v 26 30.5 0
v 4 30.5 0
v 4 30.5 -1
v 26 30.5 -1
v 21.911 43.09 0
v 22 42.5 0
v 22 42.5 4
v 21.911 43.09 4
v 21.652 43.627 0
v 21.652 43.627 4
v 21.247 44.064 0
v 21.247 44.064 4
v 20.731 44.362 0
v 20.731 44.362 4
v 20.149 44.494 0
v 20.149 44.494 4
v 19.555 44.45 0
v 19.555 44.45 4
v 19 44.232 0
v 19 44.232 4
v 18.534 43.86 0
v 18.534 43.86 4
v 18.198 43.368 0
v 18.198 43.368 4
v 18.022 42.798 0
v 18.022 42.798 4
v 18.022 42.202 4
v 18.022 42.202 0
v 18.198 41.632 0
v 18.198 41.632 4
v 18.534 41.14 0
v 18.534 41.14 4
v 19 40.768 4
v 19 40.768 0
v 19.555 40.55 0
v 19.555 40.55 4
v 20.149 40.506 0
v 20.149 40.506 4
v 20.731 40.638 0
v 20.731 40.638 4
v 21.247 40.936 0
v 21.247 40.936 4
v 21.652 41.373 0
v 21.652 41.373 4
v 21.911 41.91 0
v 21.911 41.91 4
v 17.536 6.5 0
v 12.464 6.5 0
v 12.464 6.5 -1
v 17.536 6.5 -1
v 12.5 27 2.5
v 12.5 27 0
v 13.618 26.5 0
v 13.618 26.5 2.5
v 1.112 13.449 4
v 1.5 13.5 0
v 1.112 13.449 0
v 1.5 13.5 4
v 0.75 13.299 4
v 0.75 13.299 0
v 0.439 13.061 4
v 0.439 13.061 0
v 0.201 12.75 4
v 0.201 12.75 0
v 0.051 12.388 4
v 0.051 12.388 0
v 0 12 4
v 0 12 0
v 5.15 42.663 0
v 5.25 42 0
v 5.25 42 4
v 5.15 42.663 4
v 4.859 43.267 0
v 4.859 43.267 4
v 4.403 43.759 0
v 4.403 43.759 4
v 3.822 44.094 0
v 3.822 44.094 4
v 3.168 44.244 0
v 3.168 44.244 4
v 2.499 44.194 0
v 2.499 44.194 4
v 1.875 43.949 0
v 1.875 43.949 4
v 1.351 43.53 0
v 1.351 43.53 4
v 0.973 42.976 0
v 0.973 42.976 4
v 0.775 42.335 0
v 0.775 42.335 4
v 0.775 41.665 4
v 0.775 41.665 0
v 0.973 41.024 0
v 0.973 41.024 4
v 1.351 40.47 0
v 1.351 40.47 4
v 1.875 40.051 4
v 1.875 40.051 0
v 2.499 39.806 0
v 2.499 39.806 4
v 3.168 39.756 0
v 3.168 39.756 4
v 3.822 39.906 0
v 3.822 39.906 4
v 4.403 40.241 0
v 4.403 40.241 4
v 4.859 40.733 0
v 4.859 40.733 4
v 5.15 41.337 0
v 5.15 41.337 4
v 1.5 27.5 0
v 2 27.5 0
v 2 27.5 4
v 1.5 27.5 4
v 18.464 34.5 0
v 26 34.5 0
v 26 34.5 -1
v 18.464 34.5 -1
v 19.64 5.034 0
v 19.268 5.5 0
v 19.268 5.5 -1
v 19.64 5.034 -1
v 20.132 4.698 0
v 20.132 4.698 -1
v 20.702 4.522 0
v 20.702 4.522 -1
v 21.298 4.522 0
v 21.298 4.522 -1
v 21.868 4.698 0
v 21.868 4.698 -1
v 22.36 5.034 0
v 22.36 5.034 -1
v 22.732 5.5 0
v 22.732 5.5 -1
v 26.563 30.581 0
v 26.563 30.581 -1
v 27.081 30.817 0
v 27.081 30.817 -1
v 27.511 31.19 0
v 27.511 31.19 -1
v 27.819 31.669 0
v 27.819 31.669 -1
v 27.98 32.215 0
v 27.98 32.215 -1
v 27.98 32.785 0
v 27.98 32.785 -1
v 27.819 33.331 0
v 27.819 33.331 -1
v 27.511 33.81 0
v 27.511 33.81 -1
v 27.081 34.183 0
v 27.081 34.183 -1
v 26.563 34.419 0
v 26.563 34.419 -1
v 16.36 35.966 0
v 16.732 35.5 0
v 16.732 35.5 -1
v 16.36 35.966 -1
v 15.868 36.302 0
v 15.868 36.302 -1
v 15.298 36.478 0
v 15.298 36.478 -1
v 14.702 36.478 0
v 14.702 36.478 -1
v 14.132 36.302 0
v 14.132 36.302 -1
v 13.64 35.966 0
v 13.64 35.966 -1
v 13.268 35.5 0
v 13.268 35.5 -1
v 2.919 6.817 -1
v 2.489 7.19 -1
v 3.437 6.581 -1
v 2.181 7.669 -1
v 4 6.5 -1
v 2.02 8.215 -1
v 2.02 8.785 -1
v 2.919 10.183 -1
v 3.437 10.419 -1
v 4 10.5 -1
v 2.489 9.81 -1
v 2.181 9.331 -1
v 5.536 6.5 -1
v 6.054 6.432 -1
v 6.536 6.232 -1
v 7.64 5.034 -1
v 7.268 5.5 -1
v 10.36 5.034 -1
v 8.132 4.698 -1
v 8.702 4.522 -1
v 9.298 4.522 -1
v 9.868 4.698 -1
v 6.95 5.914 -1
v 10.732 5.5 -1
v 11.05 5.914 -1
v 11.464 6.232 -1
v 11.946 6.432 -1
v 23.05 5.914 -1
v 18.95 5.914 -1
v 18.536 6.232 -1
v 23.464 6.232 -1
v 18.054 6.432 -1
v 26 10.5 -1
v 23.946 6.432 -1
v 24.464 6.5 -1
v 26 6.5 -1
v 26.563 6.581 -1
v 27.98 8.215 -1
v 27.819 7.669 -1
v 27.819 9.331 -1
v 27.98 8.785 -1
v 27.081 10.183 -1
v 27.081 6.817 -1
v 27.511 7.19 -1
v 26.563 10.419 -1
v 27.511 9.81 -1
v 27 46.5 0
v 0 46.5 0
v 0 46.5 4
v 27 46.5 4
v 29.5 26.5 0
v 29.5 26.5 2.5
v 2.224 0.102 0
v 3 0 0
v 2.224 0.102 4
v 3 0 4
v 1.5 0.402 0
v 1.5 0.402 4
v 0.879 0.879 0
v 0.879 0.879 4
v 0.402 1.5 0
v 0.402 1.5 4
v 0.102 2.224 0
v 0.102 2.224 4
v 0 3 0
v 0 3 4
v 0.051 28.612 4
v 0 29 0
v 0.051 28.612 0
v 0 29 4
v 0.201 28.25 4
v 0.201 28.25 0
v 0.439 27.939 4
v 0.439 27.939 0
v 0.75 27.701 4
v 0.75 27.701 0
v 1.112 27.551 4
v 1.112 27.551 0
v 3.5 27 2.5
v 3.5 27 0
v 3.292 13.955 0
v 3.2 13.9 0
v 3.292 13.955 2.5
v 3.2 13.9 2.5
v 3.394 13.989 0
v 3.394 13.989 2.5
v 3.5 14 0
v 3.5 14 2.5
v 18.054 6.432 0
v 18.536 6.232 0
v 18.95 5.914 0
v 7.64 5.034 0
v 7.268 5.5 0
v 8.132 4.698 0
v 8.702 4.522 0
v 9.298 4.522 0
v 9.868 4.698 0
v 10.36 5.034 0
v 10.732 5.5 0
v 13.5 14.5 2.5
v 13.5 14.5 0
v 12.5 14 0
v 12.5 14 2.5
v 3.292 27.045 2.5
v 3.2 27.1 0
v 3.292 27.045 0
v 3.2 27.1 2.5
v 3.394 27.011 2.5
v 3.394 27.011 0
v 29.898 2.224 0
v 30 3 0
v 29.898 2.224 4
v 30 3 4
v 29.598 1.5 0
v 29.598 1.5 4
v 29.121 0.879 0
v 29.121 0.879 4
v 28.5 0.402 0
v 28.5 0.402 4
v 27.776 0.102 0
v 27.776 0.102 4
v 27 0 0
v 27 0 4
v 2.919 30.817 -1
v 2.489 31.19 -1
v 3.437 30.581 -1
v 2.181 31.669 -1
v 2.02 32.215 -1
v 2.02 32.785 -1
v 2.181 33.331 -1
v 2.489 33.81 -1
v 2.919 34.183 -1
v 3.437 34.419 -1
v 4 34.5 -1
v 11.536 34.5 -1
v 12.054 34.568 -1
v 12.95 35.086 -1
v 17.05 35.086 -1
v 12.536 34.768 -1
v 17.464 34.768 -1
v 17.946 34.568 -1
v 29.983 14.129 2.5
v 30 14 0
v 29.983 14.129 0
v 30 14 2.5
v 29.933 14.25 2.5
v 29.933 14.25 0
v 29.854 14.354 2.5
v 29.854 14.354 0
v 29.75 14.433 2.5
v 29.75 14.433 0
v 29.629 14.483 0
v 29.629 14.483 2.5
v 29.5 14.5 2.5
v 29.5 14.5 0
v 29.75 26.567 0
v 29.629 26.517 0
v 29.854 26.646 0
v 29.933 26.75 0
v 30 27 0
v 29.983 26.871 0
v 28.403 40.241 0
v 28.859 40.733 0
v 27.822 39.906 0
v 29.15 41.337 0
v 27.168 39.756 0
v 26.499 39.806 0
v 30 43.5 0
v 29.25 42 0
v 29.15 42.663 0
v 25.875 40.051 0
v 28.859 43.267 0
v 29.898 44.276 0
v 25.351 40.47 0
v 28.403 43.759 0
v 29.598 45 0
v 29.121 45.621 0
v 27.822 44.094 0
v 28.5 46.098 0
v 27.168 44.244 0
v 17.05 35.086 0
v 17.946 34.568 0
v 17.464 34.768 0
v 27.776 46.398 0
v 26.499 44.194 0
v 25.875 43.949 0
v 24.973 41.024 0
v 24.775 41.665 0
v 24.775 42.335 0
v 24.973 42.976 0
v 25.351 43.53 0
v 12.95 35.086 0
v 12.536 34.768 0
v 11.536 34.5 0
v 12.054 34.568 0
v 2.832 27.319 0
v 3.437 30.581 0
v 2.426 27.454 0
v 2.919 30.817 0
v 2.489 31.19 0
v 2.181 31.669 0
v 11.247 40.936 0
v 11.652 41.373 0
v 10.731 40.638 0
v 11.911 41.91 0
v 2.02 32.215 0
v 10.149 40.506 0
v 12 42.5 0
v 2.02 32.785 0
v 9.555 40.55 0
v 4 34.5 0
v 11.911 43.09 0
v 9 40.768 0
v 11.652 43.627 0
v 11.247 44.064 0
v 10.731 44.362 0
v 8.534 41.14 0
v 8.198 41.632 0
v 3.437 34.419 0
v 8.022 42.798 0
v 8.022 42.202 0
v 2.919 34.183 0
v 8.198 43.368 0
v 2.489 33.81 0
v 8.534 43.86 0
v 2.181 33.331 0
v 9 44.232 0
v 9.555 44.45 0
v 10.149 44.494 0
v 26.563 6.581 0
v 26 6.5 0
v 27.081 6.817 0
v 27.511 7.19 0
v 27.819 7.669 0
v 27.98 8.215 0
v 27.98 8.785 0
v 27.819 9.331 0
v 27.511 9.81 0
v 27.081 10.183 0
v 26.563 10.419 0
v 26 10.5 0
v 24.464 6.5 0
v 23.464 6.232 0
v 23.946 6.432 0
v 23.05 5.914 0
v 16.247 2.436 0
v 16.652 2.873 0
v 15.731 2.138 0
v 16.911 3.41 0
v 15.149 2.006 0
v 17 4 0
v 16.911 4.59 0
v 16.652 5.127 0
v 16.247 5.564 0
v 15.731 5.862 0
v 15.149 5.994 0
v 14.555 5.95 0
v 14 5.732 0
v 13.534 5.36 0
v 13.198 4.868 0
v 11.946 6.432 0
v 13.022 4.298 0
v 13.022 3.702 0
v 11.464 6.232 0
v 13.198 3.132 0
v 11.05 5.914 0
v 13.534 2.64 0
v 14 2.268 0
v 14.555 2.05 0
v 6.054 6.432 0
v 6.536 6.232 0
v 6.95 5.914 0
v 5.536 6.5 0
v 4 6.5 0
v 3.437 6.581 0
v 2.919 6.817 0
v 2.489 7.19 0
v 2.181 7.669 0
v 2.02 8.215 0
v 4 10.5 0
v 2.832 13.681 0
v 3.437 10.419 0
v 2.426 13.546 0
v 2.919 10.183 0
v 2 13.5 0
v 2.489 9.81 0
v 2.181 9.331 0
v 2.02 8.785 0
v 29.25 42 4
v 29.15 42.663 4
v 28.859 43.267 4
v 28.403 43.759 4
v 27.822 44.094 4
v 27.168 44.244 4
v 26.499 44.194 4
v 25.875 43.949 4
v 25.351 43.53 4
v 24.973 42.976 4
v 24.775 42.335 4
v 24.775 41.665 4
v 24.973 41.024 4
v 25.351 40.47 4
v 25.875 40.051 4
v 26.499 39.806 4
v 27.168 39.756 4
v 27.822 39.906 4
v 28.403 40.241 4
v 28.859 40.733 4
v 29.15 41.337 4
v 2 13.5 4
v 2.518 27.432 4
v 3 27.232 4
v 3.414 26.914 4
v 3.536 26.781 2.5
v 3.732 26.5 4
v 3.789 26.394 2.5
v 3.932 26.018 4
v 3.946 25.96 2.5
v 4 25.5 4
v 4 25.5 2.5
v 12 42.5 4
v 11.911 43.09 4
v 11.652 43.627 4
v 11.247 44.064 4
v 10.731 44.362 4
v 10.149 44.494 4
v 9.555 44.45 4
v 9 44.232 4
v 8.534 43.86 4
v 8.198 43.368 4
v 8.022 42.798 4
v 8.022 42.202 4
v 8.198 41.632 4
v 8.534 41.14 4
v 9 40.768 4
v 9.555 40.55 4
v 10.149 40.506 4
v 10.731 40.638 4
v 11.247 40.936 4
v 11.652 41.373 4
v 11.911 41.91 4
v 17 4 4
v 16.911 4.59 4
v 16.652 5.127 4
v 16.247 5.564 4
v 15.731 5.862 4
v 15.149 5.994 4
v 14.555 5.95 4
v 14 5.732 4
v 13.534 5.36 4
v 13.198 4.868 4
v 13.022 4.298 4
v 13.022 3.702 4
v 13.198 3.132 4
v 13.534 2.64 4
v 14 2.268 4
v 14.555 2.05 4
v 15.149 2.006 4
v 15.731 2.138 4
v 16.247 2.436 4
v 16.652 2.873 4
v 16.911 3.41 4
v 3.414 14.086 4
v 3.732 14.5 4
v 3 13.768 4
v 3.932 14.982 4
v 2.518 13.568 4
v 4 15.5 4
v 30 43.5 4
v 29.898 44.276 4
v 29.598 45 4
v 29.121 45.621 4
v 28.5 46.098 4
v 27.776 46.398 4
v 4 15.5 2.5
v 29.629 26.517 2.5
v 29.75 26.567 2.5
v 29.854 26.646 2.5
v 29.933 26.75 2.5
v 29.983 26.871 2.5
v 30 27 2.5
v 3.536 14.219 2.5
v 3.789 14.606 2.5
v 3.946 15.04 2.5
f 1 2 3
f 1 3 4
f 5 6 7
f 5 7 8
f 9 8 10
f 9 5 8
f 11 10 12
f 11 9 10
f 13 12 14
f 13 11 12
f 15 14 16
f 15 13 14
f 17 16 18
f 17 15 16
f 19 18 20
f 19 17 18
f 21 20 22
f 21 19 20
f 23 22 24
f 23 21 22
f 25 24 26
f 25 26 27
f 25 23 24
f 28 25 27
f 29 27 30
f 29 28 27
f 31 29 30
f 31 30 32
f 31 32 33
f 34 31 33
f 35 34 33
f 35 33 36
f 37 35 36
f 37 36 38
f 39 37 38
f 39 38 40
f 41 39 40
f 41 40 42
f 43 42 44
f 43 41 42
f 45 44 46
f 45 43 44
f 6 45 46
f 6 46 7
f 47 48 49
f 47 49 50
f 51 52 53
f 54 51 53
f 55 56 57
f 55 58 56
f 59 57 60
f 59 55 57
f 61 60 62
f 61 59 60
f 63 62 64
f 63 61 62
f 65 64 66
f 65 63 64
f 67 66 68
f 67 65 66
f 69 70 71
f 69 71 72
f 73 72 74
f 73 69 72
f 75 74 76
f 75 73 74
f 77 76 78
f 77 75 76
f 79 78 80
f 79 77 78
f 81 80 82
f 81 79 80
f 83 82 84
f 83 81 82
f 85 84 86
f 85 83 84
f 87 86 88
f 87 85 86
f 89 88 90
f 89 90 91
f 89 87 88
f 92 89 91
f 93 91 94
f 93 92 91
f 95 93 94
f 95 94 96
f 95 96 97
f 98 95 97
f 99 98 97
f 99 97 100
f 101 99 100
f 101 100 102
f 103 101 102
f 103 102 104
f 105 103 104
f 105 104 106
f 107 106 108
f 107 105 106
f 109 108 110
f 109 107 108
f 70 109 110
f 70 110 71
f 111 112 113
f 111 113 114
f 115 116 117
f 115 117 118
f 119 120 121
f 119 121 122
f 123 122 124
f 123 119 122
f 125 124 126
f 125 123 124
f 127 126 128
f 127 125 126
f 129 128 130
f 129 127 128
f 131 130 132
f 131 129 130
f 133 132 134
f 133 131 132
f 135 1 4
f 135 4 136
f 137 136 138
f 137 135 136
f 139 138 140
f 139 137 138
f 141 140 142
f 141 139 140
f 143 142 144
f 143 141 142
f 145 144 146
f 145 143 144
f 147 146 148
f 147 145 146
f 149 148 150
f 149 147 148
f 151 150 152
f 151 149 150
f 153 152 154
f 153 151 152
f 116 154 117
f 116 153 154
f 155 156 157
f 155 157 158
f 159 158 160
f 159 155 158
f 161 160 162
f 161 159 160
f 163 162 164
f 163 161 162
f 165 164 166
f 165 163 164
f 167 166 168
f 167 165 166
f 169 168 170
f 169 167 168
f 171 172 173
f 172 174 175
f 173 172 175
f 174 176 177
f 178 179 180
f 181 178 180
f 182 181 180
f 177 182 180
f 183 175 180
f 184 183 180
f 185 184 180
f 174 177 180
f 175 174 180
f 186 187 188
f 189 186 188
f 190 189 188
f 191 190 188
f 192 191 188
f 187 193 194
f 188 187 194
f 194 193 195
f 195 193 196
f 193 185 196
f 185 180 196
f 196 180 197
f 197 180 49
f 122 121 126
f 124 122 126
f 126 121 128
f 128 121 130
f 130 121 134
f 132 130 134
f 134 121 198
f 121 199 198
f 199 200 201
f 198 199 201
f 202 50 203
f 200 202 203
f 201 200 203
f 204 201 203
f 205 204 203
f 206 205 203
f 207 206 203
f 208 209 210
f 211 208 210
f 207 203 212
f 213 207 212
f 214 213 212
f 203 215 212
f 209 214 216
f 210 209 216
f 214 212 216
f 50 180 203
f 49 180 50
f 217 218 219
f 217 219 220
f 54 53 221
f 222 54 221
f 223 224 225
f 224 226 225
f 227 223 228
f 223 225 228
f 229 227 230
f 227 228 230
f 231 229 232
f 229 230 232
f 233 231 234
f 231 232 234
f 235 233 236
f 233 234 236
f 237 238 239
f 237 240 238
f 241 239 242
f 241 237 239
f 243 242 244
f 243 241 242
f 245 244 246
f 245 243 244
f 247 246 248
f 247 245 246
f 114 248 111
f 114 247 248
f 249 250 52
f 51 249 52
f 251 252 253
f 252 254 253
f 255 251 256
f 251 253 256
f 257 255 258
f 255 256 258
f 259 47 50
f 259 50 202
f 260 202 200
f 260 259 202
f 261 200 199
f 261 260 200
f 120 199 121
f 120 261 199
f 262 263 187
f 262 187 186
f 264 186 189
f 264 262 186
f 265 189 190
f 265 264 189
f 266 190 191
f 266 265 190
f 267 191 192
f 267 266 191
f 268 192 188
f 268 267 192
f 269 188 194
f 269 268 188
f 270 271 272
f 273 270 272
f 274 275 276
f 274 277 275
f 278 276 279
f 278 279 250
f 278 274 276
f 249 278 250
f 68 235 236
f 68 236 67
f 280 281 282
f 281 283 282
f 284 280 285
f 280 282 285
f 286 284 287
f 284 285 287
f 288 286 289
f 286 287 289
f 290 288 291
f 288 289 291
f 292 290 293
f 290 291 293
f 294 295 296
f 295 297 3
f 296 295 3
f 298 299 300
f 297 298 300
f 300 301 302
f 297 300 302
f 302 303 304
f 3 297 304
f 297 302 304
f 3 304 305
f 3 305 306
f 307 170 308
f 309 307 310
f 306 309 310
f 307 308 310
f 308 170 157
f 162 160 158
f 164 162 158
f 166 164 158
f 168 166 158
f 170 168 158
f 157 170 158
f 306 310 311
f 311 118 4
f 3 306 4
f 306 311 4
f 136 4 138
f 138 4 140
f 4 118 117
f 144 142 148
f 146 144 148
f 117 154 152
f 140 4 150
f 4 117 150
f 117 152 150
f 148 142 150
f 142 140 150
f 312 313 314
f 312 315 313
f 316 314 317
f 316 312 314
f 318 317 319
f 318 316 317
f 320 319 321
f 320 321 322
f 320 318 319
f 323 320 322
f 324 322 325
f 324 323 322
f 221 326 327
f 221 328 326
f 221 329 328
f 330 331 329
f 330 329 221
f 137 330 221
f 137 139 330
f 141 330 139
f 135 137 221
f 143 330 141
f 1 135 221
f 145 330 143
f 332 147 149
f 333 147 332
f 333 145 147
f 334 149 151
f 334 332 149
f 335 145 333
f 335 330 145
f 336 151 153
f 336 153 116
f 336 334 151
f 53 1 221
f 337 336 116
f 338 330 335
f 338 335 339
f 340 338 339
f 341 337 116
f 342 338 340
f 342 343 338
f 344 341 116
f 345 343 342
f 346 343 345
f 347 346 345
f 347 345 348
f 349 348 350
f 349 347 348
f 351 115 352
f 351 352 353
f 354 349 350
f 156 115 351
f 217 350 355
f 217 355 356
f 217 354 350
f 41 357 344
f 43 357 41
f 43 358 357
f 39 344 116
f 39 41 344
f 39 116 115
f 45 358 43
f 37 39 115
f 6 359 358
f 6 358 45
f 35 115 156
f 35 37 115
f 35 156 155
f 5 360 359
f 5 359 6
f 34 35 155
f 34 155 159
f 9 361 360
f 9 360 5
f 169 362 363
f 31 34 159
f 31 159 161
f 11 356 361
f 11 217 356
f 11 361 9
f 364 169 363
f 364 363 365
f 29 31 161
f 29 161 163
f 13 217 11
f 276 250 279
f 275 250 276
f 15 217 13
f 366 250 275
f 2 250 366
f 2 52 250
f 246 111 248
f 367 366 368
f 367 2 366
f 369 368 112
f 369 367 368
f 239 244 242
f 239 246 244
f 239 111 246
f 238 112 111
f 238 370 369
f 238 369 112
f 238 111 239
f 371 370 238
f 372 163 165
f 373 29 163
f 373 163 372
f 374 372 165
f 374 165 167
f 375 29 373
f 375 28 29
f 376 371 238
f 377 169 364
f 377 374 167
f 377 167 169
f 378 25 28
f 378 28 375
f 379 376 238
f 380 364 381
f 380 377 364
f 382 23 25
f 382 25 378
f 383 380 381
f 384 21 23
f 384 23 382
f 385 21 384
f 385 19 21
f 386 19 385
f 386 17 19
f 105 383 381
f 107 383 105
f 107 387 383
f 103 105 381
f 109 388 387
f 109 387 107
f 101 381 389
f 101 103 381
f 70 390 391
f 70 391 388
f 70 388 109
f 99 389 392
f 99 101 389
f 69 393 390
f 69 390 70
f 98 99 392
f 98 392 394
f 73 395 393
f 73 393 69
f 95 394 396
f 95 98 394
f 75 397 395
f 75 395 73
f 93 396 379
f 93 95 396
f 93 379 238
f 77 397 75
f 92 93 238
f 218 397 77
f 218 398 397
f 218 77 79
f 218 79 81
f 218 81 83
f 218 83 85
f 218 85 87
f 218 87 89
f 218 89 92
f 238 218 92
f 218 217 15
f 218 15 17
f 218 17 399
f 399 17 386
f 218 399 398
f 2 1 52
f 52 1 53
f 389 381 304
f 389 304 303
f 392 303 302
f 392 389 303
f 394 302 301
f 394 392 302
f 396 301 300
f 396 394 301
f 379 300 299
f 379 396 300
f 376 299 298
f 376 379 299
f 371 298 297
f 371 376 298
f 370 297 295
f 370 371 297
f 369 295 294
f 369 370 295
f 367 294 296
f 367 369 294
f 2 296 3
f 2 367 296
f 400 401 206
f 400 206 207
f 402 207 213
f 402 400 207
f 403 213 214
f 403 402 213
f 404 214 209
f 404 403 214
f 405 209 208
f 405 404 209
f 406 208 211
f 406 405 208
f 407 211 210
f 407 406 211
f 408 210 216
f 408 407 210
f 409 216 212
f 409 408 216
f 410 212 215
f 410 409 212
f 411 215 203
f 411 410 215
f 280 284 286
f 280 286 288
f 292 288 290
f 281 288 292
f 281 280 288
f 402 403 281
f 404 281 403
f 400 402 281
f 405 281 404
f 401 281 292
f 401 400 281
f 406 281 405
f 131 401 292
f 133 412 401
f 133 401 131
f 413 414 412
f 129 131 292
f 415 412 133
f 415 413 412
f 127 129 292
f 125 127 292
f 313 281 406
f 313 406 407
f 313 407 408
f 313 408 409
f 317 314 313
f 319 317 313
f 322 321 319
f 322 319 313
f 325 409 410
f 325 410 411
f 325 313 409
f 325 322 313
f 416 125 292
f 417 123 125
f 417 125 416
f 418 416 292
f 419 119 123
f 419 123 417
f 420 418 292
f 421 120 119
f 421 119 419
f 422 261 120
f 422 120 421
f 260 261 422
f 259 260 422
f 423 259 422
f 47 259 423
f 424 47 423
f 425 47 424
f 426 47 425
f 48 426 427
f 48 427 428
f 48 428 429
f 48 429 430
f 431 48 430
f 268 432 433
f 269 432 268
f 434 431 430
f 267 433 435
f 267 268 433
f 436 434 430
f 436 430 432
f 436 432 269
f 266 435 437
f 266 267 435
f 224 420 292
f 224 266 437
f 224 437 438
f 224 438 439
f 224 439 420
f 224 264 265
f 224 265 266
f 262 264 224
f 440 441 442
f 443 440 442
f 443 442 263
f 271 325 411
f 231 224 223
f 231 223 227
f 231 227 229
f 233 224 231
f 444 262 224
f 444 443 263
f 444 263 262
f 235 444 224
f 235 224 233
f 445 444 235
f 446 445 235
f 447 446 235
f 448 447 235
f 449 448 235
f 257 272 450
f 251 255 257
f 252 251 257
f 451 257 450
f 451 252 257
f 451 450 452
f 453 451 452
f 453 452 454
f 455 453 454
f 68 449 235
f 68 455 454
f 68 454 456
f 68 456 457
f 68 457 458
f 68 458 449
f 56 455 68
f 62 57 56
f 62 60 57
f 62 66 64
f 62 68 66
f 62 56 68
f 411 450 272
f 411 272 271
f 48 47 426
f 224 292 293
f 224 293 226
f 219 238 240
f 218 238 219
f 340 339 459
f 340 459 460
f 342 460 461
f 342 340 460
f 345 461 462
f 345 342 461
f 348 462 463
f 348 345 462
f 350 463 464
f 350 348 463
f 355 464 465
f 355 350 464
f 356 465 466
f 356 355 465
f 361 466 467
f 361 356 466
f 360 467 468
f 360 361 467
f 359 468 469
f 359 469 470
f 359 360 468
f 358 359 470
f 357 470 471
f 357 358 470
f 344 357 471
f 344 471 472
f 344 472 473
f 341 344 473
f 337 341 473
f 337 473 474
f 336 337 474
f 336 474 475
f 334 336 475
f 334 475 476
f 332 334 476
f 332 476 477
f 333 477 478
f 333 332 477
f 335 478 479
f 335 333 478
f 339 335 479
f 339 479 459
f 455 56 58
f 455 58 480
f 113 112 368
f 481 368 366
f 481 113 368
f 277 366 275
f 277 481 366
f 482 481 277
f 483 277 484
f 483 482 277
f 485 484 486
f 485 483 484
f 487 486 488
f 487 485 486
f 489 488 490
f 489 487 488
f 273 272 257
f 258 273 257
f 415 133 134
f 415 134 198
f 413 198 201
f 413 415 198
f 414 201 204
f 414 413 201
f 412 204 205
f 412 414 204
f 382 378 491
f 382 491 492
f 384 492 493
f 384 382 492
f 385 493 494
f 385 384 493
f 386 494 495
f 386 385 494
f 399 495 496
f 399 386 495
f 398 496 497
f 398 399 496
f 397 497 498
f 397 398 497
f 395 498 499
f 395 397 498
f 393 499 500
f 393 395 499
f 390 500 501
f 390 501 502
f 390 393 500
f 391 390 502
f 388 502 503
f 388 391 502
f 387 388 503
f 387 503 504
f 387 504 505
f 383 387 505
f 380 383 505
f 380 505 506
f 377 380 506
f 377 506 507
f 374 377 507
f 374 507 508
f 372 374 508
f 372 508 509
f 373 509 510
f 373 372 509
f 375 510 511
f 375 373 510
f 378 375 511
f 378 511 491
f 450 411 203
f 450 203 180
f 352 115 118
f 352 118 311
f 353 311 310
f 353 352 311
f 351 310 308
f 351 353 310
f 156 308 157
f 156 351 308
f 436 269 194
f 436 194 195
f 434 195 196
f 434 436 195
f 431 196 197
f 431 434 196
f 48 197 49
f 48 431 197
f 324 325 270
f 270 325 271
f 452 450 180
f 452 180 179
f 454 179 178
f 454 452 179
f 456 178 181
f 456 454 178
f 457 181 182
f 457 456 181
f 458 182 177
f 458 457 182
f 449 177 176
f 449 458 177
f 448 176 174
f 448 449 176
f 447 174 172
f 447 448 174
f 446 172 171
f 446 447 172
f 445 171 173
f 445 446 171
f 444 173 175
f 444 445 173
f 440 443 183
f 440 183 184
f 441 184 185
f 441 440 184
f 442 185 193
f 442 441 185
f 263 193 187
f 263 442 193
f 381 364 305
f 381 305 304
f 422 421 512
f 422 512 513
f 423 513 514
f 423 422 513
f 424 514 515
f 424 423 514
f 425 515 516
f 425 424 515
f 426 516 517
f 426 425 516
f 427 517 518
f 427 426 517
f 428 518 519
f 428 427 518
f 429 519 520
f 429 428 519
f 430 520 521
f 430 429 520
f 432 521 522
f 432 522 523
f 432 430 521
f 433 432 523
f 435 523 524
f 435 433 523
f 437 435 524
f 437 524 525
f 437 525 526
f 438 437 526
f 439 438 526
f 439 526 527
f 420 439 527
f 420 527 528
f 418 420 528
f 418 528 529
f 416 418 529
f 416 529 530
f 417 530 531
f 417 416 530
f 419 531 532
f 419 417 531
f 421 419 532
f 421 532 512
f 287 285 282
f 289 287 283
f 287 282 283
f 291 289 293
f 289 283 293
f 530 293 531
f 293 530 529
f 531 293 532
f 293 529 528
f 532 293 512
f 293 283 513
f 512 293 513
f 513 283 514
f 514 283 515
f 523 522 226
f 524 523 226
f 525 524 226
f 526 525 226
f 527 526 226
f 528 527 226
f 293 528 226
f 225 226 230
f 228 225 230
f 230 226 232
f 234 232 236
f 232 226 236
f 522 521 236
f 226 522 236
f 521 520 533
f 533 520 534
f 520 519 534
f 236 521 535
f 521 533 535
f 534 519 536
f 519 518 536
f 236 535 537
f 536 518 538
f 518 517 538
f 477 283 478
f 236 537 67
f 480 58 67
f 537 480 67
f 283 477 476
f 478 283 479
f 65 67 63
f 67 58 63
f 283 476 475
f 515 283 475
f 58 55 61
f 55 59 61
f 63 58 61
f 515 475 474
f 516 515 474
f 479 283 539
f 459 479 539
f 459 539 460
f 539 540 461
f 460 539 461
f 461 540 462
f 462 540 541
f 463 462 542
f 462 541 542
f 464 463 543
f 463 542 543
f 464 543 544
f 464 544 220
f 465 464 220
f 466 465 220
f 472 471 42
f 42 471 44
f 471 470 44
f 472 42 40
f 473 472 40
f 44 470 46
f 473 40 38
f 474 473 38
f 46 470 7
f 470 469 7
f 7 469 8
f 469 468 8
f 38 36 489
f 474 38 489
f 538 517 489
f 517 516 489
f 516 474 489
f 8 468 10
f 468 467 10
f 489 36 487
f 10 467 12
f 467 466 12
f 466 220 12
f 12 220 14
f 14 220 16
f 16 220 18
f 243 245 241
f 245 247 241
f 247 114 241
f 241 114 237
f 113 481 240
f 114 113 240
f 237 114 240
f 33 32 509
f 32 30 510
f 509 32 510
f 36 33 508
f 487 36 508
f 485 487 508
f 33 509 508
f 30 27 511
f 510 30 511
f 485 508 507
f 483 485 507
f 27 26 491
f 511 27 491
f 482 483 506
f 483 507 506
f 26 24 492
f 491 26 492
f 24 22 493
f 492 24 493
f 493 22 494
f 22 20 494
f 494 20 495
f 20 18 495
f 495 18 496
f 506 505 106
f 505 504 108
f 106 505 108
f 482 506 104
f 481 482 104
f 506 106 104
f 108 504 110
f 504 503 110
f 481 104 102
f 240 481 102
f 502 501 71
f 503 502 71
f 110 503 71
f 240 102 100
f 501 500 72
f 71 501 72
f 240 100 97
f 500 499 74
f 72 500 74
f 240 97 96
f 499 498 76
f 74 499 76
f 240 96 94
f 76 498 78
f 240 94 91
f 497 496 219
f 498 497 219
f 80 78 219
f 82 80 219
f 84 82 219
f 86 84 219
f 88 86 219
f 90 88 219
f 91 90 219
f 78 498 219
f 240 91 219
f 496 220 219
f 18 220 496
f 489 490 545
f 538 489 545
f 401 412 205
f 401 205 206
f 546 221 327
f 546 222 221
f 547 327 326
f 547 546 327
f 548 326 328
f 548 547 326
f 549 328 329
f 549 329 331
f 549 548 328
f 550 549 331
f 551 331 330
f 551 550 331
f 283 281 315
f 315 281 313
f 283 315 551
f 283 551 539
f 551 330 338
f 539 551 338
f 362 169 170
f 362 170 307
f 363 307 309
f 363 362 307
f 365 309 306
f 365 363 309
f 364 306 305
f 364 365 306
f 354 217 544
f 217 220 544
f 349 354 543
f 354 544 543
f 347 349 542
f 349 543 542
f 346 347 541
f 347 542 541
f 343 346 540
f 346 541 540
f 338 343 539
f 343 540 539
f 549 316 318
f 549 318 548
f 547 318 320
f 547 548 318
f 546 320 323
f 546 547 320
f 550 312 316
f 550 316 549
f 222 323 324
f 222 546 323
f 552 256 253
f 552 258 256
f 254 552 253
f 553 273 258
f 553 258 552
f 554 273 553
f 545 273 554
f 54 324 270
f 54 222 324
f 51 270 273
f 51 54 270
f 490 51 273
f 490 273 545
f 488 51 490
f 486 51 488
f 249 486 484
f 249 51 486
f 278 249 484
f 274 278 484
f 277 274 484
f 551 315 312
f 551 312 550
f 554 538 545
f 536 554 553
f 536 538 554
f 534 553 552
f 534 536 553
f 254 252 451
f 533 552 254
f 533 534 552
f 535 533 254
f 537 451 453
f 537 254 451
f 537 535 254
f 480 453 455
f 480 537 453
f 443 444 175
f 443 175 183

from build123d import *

# Parameters (mm, degrees)
SKETCH1_R           = 2
SKETCH1_R_2         = 2.25
BOSS_EXTRUDE1_DEPTH = 4
FILLET2_R           = 1.5
FILLET3_R           = 2
FILLET5_R           = 3
BOSS_EXTRUDE2_DEPTH = 1
CUT_EXTRUDE1_DEPTH  = 2.5
FILLET6_R           = 0.5


with BuildPart() as part:
    # Sketch1 → Boss-Extrude1 (new body)
    with BuildSketch(Plane.XY):
        Polygon((0, 27.5), (0, 46.5), (30, 46.5), (30, 25), (30, 16), (30, 0), (0, 0), (0, 13.5), (4, 13.5), (4, 15), (4, 26), (4, 27.5), align=None)
        with Locations((20, 42.5)):
            Circle(SKETCH1_R, mode=Mode.SUBTRACT)
        with Locations((15, 4)):
            Circle(SKETCH1_R, mode=Mode.SUBTRACT)
        with Locations((10, 42.5)):
            Circle(SKETCH1_R, mode=Mode.SUBTRACT)
        with Locations((3, 42)):
            Circle(SKETCH1_R_2, mode=Mode.SUBTRACT)
        with Locations((27, 42)):
            Circle(SKETCH1_R_2, mode=Mode.SUBTRACT)
    extrude(amount=BOSS_EXTRUDE1_DEPTH)

    # Fillet2
    fillet2_edges = [part.edges().sort_by_distance(p)[0] for p in [
        (0, 27.5, 2),
        (0, 13.5, 2),
    ]]
    fillet(fillet2_edges, radius=FILLET2_R)

    # Fillet3
    fillet3_edges = [part.edges().sort_by_distance(p)[0] for p in [
        (4, 27.5, 2),
        (4, 13.5, 2),
    ]]
    fillet(fillet3_edges, radius=FILLET3_R)

    # Fillet5
    fillet5_edges = [part.edges().sort_by_distance(p)[0] for p in [
        (30, 46.5, 2),
        (30, 0, 2),
        (0, 0, 2),
    ]]
    fillet(fillet5_edges, radius=FILLET5_R)

    # Sketch2 → Boss-Extrude2 (add)
    with BuildSketch(Plane(origin=(0, 0, 0), x_dir=(-1, 0, 0), z_dir=(0, 0, -1))):
        with BuildLine():
            Line((-26, 34.5), (-18.464101615, 34.5))
            ThreePointArc((-18.464101615, 34.5), (-17.464101615, 34.767949192), (-16.732050808, 35.5))
            ThreePointArc((-16.732050808, 35.5), (-15, 36.5), (-13.267949192, 35.5))
            ThreePointArc((-13.267949192, 35.5), (-12.535898385, 34.767949192), (-11.535898385, 34.5))
            Line((-11.535898385, 34.5), (-4, 34.5))
            ThreePointArc((-4, 34.5), (-2, 32.5), (-4, 30.5))
            Line((-4, 30.5), (-26, 30.5))
            ThreePointArc((-26, 30.5), (-28, 32.5), (-26, 34.5))
        make_face()
        with BuildLine():
            Line((-26, 10.5), (-4, 10.5))
            ThreePointArc((-4, 10.5), (-2, 8.5), (-4, 6.5))
            Line((-4, 6.5), (-5.535898385, 6.5))
            ThreePointArc((-5.535898385, 6.5), (-6.535898385, 6.232050808), (-7.267949192, 5.5))
            ThreePointArc((-7.267949192, 5.5), (-9, 4.5), (-10.732050808, 5.5))
            ThreePointArc((-10.732050808, 5.5), (-11.464101615, 6.232050808), (-12.464101615, 6.5))
            Line((-12.464101615, 6.5), (-17.535898385, 6.5))
            ThreePointArc((-17.535898385, 6.5), (-18.535898385, 6.232050808), (-19.267949192, 5.5))
            ThreePointArc((-19.267949192, 5.5), (-21, 4.5), (-22.732050808, 5.5))
            ThreePointArc((-22.732050808, 5.5), (-23.464101615, 6.232050808), (-24.464101615, 6.5))
            Line((-24.464101615, 6.5), (-26, 6.5))
            ThreePointArc((-26, 6.5), (-28, 8.5), (-26, 10.5))
        make_face()
    extrude(amount=BOSS_EXTRUDE2_DEPTH)

    # Sketch3 → Cut-Extrude1 (cut)
    with BuildSketch(Plane(origin=(0, 0, 0), x_dir=(-1, 0, 0), z_dir=(0, 0, -1))):
        Polygon((2.333212821, 27), (-12.5, 27), (-13.618033989, 26.5), (-30, 26.5), (-30, 14.5), (-13.5, 14.5), (-12.499999912, 14), (2.333212821, 14), align=None)
    extrude(amount=-CUT_EXTRUDE1_DEPTH, mode=Mode.SUBTRACT)

    # Fillet6
    fillet6_edges = [part.edges().sort_by_distance(p)[0] for p in [
        (3.322875656, 27, 1.25),
        (3.322875656, 14, 1.25),
        (30, 14.5, 1.25),
        (30, 26.5, 1.25),
    ]]
    fillet(fillet6_edges, radius=FILLET6_R)


solid = part.part
